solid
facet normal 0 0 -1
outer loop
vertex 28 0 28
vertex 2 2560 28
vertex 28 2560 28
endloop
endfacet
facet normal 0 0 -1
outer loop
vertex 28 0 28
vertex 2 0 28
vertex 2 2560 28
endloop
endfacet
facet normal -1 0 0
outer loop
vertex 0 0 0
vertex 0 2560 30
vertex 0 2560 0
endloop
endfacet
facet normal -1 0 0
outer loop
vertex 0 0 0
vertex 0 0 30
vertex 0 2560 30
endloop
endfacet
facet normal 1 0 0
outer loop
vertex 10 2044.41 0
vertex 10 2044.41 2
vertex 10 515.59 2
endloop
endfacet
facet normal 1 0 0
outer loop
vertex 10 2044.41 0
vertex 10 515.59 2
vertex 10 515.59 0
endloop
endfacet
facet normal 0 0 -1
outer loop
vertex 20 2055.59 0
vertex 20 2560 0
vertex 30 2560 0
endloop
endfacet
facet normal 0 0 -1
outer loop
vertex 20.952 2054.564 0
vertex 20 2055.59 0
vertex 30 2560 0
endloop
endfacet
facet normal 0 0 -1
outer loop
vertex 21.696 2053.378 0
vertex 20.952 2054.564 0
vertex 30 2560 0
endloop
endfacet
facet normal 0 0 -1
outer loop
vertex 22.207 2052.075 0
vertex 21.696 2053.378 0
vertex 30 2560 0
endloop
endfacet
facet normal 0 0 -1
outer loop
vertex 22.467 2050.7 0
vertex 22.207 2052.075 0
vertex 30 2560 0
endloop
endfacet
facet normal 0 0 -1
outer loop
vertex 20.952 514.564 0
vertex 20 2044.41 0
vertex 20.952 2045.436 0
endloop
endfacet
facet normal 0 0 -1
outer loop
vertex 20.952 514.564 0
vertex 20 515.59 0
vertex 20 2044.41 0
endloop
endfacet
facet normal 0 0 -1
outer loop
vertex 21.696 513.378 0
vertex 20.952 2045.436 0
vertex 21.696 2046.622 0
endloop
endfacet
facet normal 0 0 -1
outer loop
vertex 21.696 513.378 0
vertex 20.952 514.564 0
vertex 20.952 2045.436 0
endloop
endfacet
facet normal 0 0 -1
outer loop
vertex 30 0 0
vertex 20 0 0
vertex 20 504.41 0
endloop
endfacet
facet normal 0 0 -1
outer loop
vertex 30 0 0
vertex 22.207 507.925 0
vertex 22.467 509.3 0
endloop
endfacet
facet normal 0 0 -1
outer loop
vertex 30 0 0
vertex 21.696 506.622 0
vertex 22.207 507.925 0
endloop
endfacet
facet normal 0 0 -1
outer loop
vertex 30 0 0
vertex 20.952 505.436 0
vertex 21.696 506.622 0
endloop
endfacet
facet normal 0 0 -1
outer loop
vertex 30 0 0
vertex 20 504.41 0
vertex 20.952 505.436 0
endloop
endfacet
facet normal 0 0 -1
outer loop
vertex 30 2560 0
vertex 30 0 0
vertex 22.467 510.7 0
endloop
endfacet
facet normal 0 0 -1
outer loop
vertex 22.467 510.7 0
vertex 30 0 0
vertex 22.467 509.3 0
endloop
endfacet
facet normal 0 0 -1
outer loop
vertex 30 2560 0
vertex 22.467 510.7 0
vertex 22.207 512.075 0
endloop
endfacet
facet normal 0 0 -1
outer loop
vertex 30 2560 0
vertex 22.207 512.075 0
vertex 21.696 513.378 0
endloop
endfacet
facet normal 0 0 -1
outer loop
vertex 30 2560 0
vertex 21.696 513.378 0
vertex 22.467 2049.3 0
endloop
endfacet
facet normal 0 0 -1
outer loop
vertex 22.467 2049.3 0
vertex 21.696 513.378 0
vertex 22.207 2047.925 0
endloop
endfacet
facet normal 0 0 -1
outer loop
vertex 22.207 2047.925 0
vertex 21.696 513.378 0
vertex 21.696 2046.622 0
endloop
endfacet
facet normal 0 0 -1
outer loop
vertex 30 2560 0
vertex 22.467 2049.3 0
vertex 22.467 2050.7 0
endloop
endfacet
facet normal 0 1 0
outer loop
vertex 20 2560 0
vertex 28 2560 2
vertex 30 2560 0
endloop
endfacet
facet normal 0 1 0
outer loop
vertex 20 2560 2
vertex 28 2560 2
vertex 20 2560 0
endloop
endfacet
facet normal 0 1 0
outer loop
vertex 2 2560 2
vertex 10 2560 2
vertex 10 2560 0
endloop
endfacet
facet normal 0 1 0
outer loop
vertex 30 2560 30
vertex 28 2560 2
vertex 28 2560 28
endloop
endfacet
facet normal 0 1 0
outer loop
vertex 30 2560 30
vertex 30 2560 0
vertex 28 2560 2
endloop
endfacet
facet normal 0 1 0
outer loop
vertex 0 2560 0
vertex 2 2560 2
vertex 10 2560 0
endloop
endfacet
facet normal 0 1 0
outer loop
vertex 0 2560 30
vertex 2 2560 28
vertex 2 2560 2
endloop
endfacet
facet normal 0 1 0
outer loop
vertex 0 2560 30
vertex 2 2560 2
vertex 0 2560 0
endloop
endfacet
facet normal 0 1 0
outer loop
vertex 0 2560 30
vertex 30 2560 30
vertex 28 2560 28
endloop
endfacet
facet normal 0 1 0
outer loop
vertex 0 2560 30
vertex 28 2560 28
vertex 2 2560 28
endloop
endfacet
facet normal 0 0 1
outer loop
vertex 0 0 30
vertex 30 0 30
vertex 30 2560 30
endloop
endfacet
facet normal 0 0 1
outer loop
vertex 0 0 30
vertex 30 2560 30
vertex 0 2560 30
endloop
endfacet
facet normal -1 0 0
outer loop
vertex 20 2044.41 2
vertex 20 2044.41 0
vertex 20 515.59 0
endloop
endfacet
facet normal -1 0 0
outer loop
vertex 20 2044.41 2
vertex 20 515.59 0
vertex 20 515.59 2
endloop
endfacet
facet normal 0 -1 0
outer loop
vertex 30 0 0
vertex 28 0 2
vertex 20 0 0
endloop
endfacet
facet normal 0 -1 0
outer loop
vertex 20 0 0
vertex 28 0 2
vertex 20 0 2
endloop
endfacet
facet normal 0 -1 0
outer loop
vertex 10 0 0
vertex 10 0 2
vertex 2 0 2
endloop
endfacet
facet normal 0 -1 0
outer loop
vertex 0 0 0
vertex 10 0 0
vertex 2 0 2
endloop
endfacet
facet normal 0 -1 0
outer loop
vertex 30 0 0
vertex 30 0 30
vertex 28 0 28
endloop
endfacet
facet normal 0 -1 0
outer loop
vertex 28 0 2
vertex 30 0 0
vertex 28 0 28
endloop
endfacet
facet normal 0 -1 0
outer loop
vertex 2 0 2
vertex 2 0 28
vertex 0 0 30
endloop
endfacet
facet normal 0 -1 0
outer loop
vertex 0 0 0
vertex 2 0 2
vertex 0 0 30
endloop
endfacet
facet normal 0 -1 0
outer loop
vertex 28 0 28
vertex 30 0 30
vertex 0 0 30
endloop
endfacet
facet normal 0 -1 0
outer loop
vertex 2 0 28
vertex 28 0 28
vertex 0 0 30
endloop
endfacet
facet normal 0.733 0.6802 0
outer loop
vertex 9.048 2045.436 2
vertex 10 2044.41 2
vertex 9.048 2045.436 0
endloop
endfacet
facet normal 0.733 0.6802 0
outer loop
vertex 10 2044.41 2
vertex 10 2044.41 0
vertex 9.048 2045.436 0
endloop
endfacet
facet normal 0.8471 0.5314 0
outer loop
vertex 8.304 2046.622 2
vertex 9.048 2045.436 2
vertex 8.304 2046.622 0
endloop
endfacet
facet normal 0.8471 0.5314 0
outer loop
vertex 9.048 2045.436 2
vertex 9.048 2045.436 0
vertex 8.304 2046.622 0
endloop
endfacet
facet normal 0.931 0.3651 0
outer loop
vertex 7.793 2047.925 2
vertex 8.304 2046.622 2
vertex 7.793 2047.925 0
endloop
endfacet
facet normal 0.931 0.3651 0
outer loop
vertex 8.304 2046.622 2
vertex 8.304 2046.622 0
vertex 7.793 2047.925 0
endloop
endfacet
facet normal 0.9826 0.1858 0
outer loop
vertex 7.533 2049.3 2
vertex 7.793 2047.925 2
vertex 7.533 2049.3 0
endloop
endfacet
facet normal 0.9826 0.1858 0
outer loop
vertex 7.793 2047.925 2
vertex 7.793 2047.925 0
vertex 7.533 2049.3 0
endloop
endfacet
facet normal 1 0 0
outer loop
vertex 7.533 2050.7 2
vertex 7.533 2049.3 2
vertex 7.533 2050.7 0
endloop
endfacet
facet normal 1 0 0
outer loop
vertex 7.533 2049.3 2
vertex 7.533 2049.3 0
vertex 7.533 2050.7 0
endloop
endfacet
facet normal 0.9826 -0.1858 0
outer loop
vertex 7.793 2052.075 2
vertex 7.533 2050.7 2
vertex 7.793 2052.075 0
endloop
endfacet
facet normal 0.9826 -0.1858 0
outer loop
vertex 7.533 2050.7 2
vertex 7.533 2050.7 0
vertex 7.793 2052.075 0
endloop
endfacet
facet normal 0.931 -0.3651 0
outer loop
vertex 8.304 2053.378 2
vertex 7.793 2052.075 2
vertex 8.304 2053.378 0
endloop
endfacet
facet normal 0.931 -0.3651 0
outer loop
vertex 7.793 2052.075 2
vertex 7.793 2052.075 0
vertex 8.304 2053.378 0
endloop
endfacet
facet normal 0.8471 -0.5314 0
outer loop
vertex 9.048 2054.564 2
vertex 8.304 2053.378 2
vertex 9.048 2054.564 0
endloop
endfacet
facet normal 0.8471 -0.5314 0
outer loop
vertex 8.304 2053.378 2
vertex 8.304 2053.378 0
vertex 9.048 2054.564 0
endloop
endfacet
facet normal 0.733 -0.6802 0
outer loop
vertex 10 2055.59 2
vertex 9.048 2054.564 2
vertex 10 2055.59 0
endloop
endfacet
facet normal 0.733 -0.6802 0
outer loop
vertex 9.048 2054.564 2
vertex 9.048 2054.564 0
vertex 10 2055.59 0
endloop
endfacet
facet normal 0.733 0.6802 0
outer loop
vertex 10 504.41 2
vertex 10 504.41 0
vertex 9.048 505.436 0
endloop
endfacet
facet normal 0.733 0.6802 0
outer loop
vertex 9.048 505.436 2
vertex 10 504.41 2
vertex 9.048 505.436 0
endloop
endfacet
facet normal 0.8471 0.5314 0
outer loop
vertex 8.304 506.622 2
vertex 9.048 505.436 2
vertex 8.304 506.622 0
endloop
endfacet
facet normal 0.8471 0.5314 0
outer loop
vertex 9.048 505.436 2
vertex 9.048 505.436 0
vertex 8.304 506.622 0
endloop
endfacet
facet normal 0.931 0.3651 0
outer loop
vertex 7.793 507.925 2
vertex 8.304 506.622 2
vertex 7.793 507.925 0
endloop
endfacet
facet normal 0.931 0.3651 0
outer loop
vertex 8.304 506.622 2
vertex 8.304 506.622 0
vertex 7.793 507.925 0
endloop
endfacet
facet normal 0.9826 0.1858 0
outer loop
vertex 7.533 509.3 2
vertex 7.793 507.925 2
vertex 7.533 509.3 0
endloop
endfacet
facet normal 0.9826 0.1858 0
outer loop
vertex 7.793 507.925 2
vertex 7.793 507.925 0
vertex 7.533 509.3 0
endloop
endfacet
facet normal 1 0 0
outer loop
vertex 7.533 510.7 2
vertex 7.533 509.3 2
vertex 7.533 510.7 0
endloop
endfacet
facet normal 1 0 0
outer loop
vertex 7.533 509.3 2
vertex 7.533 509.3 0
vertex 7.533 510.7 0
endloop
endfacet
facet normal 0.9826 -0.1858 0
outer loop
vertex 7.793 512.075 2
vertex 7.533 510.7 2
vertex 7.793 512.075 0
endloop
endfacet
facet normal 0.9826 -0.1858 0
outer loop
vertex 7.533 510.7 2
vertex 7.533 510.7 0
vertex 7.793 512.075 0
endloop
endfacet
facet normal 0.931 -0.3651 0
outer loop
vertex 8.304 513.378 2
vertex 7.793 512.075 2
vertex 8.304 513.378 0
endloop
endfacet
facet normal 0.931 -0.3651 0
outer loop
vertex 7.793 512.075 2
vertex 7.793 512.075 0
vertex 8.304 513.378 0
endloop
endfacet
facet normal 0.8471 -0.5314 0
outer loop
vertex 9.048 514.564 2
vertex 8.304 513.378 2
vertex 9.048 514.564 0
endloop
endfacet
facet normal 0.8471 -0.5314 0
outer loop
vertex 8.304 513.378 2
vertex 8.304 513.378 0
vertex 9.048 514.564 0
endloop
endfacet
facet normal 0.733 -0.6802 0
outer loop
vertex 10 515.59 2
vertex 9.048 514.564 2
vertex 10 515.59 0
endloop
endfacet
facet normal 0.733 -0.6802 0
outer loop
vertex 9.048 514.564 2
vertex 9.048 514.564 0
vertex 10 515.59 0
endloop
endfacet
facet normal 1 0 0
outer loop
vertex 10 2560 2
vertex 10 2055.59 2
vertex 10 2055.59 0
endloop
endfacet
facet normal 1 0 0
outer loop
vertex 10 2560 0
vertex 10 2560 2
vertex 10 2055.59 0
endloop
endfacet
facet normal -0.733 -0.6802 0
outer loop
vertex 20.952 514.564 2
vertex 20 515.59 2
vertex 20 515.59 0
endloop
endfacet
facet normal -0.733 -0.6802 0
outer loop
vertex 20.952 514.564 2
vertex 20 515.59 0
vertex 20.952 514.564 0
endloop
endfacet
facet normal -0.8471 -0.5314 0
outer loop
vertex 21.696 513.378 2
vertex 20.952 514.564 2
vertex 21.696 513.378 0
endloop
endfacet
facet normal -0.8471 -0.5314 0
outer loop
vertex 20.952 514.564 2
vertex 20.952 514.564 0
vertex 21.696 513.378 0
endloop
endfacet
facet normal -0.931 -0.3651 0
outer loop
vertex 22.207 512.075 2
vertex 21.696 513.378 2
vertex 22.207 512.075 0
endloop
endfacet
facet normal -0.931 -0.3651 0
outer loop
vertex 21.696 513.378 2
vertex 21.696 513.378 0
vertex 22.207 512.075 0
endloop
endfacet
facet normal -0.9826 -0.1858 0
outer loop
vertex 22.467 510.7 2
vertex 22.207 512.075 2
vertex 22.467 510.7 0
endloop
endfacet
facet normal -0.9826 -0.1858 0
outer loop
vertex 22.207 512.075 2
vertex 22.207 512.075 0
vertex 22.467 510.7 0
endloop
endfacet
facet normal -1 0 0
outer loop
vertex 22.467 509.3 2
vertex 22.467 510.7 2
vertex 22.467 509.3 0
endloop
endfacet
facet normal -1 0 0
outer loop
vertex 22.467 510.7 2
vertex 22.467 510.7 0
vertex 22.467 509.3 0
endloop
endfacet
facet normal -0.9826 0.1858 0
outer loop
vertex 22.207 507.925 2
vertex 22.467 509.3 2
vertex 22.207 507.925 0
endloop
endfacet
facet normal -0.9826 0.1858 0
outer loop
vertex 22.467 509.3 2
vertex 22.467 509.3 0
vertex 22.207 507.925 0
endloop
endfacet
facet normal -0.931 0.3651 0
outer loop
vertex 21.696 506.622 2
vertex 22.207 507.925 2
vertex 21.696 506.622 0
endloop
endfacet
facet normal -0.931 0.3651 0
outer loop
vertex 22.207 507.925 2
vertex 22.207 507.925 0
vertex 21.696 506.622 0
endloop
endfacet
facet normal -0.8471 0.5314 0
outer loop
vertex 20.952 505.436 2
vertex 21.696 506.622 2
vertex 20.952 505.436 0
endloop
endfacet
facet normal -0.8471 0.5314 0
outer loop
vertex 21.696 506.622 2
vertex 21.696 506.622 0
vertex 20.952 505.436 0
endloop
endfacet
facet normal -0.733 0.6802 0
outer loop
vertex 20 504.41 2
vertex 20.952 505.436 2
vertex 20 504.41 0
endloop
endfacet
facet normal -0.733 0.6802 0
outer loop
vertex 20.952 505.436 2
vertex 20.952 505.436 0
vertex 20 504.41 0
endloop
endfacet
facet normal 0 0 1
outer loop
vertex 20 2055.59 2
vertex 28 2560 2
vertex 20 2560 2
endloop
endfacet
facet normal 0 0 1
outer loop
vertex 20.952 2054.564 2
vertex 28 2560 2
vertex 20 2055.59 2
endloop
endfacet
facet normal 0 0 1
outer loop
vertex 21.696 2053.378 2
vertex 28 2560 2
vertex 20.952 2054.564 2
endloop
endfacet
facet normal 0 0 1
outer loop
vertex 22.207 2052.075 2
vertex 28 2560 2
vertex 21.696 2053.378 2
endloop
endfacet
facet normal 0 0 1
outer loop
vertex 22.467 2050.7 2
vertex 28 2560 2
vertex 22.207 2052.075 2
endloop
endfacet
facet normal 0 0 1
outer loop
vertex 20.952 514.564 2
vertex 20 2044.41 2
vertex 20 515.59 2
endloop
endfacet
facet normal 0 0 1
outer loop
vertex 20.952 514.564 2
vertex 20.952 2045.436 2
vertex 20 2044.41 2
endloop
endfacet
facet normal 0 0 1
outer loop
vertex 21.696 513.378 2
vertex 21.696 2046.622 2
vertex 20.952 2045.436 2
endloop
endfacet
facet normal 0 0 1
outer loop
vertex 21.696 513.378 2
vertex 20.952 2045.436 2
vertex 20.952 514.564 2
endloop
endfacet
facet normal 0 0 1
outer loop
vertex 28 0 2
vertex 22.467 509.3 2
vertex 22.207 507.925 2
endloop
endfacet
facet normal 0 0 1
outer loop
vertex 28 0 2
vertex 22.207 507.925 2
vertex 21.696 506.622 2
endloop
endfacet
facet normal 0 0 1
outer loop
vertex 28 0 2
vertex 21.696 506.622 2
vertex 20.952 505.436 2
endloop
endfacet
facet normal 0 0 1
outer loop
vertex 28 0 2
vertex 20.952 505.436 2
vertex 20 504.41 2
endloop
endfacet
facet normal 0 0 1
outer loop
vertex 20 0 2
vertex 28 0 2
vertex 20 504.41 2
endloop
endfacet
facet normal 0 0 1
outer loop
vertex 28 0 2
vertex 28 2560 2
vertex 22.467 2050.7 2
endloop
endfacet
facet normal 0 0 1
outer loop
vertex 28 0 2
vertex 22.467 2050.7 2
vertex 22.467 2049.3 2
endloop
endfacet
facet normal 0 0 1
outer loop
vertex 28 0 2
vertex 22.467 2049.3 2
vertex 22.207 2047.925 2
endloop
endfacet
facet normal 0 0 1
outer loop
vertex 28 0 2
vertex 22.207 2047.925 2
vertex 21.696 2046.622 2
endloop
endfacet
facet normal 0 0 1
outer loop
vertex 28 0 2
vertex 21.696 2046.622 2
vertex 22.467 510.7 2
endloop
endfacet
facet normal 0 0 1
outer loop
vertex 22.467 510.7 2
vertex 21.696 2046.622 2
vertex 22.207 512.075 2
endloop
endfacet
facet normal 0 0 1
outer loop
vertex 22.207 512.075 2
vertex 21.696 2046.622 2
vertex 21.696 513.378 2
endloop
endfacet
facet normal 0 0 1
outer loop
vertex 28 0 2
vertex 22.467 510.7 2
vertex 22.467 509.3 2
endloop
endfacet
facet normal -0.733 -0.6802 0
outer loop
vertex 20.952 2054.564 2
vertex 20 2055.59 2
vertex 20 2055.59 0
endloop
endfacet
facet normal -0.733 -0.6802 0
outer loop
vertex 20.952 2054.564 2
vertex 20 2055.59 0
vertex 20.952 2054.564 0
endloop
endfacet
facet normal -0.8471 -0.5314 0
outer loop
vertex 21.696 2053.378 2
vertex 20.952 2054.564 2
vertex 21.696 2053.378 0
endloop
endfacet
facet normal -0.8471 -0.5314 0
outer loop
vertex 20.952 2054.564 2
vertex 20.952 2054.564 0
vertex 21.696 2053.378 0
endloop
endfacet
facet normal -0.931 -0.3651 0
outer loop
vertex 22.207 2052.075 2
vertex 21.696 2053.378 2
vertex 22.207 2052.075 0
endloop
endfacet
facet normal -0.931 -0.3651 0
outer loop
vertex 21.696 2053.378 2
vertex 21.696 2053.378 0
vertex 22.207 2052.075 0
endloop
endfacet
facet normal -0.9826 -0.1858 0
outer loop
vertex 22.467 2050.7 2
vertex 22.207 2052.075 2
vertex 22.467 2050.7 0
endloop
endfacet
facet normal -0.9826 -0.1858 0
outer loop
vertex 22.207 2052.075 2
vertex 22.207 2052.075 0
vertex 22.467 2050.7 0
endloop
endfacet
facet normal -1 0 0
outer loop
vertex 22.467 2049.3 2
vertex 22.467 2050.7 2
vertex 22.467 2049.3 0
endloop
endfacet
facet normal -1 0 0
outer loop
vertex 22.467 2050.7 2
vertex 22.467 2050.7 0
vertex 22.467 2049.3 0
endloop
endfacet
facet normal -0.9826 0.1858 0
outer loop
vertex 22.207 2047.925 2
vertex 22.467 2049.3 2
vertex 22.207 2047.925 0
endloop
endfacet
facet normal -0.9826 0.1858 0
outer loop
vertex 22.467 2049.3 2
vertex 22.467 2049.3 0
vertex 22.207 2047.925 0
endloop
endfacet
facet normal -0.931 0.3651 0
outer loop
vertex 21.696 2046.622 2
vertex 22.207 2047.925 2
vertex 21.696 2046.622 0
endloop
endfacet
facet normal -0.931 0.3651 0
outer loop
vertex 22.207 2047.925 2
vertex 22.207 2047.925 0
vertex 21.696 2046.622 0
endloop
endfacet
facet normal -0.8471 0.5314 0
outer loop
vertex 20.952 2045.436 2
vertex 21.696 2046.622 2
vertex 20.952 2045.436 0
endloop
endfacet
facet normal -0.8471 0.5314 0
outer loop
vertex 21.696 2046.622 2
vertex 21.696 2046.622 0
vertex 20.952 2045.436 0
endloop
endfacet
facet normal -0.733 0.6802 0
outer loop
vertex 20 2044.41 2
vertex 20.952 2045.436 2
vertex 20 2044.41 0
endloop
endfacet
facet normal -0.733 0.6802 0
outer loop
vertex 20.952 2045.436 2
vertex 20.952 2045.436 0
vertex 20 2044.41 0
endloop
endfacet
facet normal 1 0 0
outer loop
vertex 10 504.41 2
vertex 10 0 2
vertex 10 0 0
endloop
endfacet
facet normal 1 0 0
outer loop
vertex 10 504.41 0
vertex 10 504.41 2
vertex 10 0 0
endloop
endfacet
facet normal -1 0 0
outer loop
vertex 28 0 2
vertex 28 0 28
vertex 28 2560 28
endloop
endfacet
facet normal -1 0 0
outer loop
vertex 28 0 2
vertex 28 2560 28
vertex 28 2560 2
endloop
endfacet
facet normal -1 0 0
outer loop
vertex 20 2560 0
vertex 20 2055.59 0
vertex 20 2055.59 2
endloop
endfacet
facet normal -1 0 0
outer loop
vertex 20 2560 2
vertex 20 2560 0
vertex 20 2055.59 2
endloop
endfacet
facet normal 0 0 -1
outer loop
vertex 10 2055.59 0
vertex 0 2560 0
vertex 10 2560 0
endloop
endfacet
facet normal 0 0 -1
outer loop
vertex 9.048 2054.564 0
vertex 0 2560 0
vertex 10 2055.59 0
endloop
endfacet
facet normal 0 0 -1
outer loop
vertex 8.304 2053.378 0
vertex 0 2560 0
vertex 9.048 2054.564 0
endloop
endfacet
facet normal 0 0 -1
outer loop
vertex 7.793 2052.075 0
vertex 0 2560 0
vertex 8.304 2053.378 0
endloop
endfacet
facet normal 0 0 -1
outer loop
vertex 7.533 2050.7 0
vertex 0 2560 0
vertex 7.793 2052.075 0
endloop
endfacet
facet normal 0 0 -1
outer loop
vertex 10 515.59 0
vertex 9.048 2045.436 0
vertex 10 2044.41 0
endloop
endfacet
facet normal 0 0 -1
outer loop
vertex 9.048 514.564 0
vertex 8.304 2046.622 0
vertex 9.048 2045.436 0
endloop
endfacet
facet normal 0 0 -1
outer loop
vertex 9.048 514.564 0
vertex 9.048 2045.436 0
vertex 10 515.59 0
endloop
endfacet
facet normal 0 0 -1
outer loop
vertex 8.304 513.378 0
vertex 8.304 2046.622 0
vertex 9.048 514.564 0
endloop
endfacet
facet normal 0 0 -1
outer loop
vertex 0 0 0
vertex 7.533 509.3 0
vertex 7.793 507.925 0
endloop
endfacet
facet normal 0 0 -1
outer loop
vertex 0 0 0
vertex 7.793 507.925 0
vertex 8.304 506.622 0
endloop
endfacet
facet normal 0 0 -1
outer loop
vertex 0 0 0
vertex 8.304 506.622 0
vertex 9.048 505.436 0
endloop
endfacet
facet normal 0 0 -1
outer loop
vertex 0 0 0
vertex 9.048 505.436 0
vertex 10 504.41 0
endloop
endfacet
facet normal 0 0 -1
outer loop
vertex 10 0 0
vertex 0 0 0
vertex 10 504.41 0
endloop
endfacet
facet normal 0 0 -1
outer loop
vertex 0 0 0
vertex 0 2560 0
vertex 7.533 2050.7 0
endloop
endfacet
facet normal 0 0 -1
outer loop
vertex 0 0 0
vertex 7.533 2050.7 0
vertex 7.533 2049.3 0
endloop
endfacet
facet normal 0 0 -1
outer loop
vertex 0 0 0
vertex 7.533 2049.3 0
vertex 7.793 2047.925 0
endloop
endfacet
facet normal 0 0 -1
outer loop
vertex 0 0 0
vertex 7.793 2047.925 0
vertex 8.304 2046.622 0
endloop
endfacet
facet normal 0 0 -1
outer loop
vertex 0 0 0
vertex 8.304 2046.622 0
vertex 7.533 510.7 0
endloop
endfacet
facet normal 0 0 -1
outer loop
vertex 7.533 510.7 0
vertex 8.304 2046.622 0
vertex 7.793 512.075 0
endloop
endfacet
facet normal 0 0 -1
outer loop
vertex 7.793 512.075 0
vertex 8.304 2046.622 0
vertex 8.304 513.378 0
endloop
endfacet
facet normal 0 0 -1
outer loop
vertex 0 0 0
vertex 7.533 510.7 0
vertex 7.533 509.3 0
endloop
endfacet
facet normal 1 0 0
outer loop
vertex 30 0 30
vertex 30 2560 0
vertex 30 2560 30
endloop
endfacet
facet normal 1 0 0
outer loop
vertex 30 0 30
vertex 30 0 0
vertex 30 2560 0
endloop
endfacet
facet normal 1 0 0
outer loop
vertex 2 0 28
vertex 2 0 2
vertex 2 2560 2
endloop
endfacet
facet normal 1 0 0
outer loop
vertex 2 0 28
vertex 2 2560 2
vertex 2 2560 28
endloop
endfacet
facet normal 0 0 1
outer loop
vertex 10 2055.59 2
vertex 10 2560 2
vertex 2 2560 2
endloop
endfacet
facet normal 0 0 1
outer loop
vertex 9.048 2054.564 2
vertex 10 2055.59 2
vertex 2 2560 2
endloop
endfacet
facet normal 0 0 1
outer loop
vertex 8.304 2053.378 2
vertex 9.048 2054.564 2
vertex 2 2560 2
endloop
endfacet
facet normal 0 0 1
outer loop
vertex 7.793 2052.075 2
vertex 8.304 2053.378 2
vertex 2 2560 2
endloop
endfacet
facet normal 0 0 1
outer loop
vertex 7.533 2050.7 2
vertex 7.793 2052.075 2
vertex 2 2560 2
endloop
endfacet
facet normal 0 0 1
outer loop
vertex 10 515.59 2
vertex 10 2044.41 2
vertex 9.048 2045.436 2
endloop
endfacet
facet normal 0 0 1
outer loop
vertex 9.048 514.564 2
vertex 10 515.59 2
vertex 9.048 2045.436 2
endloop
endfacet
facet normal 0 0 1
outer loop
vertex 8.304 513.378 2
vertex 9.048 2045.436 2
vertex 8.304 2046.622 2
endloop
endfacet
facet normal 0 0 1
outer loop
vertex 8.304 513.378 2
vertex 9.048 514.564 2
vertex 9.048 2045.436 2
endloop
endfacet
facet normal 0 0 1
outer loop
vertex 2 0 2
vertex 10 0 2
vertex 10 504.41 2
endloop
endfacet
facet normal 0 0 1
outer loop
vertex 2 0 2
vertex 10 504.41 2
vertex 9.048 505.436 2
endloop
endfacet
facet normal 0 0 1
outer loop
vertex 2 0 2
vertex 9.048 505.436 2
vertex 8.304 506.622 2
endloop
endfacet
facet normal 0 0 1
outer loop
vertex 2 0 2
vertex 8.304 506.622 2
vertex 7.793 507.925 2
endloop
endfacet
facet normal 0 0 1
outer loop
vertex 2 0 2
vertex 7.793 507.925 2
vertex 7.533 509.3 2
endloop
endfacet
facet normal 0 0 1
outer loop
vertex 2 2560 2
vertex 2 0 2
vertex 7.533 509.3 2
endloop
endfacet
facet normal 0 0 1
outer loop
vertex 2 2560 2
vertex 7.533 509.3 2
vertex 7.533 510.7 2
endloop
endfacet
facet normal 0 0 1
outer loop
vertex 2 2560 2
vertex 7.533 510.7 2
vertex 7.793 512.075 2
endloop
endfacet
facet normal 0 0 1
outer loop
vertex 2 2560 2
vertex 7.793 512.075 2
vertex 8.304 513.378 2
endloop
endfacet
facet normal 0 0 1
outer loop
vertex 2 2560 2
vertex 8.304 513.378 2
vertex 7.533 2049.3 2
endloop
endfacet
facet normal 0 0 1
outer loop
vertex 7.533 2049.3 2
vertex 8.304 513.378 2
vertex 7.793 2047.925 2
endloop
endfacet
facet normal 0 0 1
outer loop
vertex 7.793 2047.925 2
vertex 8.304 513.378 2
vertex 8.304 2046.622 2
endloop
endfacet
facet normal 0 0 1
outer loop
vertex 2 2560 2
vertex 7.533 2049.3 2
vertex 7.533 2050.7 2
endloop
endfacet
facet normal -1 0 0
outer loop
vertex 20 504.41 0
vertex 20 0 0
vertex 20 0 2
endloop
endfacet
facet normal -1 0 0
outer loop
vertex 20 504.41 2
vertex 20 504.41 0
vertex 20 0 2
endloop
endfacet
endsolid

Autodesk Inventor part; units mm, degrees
ref_plane "YZ Plane" through (0, 0, 0) normal (1, 0, 0) x (0, 1, 0)
ref_plane "XZ Plane" through (0, 0, 0) normal (0, 1, 0) x (-1, 0, 0)
ref_plane "XY Plane" through (0, 0, 0) normal (0, 0, 1) x (1, 0, 0)
sketch "Sketch1" plane through (0, 0, 0) normal (0, 1, 0) x (-1, 0, 0)
  line L0 (0, 0) -> (-30, 0)
  line L1 (-30, 0) -> (-30, 30)
  line L2 (-30, 30) -> (0, 30)
  line L3 (0, 30) -> (0, 0)
  line L4 (-2, 28) -> (-28, 28)
  line L5 (-28, 28) -> (-28, 2)
  line L6 (-28, 2) -> (-2, 2)
  line L7 (-2, 2) -> (-2, 28)
  line L8 (-10, 0) -> (-20, 0)
  line L9 (-20, 0) -> (-20, 30)
  line L10 (-20, 30) -> (-10, 30)
  line L11 (-10, 30) -> (-10, 0)
  line L12 (-10, 0) -> (-20, 30) construction
  line L13 (-20, 0) -> (-10, 30) construction
  point P0 (-15, 15)
  point P1 (-20, 2)
  point P2 (-10, 2)
  dimension "d0" = 30
  dimension "d1" = 30
  dimension "d2" = 2
  dimension "d3" = 10
  dimension "d4" = 30
  dimension "d5" = 15
extrude "Extrusion1" add sketch "Sketch1" along normal blind 2560 contours L0 L11 L6 L7 L4 L2 L3 | L0 L1 L2 L9 L4 L5 L6 | L11 L4 L9 L2
sketch "Sketch2" plane through (20, 0, 0) normal (0, 0, -1) x (-1, 0, 0)
  line L0 (-10, 0) -> (0, 0) projected
  line L1 (0, 0) -> (0, 2560) projected
  line L2 (-10, 2560) -> (0, 2560) projected
  line L3 (-10, 0) -> (-10, 2560) projected
  line L4 (10, 0) -> (20, 0) projected
  line L5 (20, 0) -> (20, 2560) projected
  line L6 (10, 2560) -> (20, 2560) projected
  line L7 (10, 0) -> (10, 2560) projected
  line L8 (-8, 2560) -> (18, 2560) construction
  line L9 (5, 2560) -> (5, 2050) construction
  circle A0 centre (5, 2050) radius 7.5
  line L10 (-8, 0) -> (18, 0) construction
  line L11 (5, 0) -> (5, 510) construction
  circle A1 centre (5, 510) radius 7.5
  point P0 (10, 2055.5902)
  point P1 (10, 2044.4098)
  point P2 (0, 2055.5902)
  point P3 (0, 2044.4098)
  point P4 (10, 515.5902)
  point P5 (10, 504.4098)
  point P6 (0, 515.5902)
  point P7 (0, 504.4098)
  dimension "d8" = 510
  dimension "d9" = 15
  dimension "d10" = 510
  dimension "d11" = 15
extrude "Extrusion2" cut sketch "Sketch2" against normal up to surface (2 mm away) contours A1 L1 | L7 A1 | L1 A0 | A0 L7
equation "\"d4\" = d1"
equation "\"d5\" = 0.5 * d1"
equation "\"d10\" = d8"
properties part number "guiaPorta"
